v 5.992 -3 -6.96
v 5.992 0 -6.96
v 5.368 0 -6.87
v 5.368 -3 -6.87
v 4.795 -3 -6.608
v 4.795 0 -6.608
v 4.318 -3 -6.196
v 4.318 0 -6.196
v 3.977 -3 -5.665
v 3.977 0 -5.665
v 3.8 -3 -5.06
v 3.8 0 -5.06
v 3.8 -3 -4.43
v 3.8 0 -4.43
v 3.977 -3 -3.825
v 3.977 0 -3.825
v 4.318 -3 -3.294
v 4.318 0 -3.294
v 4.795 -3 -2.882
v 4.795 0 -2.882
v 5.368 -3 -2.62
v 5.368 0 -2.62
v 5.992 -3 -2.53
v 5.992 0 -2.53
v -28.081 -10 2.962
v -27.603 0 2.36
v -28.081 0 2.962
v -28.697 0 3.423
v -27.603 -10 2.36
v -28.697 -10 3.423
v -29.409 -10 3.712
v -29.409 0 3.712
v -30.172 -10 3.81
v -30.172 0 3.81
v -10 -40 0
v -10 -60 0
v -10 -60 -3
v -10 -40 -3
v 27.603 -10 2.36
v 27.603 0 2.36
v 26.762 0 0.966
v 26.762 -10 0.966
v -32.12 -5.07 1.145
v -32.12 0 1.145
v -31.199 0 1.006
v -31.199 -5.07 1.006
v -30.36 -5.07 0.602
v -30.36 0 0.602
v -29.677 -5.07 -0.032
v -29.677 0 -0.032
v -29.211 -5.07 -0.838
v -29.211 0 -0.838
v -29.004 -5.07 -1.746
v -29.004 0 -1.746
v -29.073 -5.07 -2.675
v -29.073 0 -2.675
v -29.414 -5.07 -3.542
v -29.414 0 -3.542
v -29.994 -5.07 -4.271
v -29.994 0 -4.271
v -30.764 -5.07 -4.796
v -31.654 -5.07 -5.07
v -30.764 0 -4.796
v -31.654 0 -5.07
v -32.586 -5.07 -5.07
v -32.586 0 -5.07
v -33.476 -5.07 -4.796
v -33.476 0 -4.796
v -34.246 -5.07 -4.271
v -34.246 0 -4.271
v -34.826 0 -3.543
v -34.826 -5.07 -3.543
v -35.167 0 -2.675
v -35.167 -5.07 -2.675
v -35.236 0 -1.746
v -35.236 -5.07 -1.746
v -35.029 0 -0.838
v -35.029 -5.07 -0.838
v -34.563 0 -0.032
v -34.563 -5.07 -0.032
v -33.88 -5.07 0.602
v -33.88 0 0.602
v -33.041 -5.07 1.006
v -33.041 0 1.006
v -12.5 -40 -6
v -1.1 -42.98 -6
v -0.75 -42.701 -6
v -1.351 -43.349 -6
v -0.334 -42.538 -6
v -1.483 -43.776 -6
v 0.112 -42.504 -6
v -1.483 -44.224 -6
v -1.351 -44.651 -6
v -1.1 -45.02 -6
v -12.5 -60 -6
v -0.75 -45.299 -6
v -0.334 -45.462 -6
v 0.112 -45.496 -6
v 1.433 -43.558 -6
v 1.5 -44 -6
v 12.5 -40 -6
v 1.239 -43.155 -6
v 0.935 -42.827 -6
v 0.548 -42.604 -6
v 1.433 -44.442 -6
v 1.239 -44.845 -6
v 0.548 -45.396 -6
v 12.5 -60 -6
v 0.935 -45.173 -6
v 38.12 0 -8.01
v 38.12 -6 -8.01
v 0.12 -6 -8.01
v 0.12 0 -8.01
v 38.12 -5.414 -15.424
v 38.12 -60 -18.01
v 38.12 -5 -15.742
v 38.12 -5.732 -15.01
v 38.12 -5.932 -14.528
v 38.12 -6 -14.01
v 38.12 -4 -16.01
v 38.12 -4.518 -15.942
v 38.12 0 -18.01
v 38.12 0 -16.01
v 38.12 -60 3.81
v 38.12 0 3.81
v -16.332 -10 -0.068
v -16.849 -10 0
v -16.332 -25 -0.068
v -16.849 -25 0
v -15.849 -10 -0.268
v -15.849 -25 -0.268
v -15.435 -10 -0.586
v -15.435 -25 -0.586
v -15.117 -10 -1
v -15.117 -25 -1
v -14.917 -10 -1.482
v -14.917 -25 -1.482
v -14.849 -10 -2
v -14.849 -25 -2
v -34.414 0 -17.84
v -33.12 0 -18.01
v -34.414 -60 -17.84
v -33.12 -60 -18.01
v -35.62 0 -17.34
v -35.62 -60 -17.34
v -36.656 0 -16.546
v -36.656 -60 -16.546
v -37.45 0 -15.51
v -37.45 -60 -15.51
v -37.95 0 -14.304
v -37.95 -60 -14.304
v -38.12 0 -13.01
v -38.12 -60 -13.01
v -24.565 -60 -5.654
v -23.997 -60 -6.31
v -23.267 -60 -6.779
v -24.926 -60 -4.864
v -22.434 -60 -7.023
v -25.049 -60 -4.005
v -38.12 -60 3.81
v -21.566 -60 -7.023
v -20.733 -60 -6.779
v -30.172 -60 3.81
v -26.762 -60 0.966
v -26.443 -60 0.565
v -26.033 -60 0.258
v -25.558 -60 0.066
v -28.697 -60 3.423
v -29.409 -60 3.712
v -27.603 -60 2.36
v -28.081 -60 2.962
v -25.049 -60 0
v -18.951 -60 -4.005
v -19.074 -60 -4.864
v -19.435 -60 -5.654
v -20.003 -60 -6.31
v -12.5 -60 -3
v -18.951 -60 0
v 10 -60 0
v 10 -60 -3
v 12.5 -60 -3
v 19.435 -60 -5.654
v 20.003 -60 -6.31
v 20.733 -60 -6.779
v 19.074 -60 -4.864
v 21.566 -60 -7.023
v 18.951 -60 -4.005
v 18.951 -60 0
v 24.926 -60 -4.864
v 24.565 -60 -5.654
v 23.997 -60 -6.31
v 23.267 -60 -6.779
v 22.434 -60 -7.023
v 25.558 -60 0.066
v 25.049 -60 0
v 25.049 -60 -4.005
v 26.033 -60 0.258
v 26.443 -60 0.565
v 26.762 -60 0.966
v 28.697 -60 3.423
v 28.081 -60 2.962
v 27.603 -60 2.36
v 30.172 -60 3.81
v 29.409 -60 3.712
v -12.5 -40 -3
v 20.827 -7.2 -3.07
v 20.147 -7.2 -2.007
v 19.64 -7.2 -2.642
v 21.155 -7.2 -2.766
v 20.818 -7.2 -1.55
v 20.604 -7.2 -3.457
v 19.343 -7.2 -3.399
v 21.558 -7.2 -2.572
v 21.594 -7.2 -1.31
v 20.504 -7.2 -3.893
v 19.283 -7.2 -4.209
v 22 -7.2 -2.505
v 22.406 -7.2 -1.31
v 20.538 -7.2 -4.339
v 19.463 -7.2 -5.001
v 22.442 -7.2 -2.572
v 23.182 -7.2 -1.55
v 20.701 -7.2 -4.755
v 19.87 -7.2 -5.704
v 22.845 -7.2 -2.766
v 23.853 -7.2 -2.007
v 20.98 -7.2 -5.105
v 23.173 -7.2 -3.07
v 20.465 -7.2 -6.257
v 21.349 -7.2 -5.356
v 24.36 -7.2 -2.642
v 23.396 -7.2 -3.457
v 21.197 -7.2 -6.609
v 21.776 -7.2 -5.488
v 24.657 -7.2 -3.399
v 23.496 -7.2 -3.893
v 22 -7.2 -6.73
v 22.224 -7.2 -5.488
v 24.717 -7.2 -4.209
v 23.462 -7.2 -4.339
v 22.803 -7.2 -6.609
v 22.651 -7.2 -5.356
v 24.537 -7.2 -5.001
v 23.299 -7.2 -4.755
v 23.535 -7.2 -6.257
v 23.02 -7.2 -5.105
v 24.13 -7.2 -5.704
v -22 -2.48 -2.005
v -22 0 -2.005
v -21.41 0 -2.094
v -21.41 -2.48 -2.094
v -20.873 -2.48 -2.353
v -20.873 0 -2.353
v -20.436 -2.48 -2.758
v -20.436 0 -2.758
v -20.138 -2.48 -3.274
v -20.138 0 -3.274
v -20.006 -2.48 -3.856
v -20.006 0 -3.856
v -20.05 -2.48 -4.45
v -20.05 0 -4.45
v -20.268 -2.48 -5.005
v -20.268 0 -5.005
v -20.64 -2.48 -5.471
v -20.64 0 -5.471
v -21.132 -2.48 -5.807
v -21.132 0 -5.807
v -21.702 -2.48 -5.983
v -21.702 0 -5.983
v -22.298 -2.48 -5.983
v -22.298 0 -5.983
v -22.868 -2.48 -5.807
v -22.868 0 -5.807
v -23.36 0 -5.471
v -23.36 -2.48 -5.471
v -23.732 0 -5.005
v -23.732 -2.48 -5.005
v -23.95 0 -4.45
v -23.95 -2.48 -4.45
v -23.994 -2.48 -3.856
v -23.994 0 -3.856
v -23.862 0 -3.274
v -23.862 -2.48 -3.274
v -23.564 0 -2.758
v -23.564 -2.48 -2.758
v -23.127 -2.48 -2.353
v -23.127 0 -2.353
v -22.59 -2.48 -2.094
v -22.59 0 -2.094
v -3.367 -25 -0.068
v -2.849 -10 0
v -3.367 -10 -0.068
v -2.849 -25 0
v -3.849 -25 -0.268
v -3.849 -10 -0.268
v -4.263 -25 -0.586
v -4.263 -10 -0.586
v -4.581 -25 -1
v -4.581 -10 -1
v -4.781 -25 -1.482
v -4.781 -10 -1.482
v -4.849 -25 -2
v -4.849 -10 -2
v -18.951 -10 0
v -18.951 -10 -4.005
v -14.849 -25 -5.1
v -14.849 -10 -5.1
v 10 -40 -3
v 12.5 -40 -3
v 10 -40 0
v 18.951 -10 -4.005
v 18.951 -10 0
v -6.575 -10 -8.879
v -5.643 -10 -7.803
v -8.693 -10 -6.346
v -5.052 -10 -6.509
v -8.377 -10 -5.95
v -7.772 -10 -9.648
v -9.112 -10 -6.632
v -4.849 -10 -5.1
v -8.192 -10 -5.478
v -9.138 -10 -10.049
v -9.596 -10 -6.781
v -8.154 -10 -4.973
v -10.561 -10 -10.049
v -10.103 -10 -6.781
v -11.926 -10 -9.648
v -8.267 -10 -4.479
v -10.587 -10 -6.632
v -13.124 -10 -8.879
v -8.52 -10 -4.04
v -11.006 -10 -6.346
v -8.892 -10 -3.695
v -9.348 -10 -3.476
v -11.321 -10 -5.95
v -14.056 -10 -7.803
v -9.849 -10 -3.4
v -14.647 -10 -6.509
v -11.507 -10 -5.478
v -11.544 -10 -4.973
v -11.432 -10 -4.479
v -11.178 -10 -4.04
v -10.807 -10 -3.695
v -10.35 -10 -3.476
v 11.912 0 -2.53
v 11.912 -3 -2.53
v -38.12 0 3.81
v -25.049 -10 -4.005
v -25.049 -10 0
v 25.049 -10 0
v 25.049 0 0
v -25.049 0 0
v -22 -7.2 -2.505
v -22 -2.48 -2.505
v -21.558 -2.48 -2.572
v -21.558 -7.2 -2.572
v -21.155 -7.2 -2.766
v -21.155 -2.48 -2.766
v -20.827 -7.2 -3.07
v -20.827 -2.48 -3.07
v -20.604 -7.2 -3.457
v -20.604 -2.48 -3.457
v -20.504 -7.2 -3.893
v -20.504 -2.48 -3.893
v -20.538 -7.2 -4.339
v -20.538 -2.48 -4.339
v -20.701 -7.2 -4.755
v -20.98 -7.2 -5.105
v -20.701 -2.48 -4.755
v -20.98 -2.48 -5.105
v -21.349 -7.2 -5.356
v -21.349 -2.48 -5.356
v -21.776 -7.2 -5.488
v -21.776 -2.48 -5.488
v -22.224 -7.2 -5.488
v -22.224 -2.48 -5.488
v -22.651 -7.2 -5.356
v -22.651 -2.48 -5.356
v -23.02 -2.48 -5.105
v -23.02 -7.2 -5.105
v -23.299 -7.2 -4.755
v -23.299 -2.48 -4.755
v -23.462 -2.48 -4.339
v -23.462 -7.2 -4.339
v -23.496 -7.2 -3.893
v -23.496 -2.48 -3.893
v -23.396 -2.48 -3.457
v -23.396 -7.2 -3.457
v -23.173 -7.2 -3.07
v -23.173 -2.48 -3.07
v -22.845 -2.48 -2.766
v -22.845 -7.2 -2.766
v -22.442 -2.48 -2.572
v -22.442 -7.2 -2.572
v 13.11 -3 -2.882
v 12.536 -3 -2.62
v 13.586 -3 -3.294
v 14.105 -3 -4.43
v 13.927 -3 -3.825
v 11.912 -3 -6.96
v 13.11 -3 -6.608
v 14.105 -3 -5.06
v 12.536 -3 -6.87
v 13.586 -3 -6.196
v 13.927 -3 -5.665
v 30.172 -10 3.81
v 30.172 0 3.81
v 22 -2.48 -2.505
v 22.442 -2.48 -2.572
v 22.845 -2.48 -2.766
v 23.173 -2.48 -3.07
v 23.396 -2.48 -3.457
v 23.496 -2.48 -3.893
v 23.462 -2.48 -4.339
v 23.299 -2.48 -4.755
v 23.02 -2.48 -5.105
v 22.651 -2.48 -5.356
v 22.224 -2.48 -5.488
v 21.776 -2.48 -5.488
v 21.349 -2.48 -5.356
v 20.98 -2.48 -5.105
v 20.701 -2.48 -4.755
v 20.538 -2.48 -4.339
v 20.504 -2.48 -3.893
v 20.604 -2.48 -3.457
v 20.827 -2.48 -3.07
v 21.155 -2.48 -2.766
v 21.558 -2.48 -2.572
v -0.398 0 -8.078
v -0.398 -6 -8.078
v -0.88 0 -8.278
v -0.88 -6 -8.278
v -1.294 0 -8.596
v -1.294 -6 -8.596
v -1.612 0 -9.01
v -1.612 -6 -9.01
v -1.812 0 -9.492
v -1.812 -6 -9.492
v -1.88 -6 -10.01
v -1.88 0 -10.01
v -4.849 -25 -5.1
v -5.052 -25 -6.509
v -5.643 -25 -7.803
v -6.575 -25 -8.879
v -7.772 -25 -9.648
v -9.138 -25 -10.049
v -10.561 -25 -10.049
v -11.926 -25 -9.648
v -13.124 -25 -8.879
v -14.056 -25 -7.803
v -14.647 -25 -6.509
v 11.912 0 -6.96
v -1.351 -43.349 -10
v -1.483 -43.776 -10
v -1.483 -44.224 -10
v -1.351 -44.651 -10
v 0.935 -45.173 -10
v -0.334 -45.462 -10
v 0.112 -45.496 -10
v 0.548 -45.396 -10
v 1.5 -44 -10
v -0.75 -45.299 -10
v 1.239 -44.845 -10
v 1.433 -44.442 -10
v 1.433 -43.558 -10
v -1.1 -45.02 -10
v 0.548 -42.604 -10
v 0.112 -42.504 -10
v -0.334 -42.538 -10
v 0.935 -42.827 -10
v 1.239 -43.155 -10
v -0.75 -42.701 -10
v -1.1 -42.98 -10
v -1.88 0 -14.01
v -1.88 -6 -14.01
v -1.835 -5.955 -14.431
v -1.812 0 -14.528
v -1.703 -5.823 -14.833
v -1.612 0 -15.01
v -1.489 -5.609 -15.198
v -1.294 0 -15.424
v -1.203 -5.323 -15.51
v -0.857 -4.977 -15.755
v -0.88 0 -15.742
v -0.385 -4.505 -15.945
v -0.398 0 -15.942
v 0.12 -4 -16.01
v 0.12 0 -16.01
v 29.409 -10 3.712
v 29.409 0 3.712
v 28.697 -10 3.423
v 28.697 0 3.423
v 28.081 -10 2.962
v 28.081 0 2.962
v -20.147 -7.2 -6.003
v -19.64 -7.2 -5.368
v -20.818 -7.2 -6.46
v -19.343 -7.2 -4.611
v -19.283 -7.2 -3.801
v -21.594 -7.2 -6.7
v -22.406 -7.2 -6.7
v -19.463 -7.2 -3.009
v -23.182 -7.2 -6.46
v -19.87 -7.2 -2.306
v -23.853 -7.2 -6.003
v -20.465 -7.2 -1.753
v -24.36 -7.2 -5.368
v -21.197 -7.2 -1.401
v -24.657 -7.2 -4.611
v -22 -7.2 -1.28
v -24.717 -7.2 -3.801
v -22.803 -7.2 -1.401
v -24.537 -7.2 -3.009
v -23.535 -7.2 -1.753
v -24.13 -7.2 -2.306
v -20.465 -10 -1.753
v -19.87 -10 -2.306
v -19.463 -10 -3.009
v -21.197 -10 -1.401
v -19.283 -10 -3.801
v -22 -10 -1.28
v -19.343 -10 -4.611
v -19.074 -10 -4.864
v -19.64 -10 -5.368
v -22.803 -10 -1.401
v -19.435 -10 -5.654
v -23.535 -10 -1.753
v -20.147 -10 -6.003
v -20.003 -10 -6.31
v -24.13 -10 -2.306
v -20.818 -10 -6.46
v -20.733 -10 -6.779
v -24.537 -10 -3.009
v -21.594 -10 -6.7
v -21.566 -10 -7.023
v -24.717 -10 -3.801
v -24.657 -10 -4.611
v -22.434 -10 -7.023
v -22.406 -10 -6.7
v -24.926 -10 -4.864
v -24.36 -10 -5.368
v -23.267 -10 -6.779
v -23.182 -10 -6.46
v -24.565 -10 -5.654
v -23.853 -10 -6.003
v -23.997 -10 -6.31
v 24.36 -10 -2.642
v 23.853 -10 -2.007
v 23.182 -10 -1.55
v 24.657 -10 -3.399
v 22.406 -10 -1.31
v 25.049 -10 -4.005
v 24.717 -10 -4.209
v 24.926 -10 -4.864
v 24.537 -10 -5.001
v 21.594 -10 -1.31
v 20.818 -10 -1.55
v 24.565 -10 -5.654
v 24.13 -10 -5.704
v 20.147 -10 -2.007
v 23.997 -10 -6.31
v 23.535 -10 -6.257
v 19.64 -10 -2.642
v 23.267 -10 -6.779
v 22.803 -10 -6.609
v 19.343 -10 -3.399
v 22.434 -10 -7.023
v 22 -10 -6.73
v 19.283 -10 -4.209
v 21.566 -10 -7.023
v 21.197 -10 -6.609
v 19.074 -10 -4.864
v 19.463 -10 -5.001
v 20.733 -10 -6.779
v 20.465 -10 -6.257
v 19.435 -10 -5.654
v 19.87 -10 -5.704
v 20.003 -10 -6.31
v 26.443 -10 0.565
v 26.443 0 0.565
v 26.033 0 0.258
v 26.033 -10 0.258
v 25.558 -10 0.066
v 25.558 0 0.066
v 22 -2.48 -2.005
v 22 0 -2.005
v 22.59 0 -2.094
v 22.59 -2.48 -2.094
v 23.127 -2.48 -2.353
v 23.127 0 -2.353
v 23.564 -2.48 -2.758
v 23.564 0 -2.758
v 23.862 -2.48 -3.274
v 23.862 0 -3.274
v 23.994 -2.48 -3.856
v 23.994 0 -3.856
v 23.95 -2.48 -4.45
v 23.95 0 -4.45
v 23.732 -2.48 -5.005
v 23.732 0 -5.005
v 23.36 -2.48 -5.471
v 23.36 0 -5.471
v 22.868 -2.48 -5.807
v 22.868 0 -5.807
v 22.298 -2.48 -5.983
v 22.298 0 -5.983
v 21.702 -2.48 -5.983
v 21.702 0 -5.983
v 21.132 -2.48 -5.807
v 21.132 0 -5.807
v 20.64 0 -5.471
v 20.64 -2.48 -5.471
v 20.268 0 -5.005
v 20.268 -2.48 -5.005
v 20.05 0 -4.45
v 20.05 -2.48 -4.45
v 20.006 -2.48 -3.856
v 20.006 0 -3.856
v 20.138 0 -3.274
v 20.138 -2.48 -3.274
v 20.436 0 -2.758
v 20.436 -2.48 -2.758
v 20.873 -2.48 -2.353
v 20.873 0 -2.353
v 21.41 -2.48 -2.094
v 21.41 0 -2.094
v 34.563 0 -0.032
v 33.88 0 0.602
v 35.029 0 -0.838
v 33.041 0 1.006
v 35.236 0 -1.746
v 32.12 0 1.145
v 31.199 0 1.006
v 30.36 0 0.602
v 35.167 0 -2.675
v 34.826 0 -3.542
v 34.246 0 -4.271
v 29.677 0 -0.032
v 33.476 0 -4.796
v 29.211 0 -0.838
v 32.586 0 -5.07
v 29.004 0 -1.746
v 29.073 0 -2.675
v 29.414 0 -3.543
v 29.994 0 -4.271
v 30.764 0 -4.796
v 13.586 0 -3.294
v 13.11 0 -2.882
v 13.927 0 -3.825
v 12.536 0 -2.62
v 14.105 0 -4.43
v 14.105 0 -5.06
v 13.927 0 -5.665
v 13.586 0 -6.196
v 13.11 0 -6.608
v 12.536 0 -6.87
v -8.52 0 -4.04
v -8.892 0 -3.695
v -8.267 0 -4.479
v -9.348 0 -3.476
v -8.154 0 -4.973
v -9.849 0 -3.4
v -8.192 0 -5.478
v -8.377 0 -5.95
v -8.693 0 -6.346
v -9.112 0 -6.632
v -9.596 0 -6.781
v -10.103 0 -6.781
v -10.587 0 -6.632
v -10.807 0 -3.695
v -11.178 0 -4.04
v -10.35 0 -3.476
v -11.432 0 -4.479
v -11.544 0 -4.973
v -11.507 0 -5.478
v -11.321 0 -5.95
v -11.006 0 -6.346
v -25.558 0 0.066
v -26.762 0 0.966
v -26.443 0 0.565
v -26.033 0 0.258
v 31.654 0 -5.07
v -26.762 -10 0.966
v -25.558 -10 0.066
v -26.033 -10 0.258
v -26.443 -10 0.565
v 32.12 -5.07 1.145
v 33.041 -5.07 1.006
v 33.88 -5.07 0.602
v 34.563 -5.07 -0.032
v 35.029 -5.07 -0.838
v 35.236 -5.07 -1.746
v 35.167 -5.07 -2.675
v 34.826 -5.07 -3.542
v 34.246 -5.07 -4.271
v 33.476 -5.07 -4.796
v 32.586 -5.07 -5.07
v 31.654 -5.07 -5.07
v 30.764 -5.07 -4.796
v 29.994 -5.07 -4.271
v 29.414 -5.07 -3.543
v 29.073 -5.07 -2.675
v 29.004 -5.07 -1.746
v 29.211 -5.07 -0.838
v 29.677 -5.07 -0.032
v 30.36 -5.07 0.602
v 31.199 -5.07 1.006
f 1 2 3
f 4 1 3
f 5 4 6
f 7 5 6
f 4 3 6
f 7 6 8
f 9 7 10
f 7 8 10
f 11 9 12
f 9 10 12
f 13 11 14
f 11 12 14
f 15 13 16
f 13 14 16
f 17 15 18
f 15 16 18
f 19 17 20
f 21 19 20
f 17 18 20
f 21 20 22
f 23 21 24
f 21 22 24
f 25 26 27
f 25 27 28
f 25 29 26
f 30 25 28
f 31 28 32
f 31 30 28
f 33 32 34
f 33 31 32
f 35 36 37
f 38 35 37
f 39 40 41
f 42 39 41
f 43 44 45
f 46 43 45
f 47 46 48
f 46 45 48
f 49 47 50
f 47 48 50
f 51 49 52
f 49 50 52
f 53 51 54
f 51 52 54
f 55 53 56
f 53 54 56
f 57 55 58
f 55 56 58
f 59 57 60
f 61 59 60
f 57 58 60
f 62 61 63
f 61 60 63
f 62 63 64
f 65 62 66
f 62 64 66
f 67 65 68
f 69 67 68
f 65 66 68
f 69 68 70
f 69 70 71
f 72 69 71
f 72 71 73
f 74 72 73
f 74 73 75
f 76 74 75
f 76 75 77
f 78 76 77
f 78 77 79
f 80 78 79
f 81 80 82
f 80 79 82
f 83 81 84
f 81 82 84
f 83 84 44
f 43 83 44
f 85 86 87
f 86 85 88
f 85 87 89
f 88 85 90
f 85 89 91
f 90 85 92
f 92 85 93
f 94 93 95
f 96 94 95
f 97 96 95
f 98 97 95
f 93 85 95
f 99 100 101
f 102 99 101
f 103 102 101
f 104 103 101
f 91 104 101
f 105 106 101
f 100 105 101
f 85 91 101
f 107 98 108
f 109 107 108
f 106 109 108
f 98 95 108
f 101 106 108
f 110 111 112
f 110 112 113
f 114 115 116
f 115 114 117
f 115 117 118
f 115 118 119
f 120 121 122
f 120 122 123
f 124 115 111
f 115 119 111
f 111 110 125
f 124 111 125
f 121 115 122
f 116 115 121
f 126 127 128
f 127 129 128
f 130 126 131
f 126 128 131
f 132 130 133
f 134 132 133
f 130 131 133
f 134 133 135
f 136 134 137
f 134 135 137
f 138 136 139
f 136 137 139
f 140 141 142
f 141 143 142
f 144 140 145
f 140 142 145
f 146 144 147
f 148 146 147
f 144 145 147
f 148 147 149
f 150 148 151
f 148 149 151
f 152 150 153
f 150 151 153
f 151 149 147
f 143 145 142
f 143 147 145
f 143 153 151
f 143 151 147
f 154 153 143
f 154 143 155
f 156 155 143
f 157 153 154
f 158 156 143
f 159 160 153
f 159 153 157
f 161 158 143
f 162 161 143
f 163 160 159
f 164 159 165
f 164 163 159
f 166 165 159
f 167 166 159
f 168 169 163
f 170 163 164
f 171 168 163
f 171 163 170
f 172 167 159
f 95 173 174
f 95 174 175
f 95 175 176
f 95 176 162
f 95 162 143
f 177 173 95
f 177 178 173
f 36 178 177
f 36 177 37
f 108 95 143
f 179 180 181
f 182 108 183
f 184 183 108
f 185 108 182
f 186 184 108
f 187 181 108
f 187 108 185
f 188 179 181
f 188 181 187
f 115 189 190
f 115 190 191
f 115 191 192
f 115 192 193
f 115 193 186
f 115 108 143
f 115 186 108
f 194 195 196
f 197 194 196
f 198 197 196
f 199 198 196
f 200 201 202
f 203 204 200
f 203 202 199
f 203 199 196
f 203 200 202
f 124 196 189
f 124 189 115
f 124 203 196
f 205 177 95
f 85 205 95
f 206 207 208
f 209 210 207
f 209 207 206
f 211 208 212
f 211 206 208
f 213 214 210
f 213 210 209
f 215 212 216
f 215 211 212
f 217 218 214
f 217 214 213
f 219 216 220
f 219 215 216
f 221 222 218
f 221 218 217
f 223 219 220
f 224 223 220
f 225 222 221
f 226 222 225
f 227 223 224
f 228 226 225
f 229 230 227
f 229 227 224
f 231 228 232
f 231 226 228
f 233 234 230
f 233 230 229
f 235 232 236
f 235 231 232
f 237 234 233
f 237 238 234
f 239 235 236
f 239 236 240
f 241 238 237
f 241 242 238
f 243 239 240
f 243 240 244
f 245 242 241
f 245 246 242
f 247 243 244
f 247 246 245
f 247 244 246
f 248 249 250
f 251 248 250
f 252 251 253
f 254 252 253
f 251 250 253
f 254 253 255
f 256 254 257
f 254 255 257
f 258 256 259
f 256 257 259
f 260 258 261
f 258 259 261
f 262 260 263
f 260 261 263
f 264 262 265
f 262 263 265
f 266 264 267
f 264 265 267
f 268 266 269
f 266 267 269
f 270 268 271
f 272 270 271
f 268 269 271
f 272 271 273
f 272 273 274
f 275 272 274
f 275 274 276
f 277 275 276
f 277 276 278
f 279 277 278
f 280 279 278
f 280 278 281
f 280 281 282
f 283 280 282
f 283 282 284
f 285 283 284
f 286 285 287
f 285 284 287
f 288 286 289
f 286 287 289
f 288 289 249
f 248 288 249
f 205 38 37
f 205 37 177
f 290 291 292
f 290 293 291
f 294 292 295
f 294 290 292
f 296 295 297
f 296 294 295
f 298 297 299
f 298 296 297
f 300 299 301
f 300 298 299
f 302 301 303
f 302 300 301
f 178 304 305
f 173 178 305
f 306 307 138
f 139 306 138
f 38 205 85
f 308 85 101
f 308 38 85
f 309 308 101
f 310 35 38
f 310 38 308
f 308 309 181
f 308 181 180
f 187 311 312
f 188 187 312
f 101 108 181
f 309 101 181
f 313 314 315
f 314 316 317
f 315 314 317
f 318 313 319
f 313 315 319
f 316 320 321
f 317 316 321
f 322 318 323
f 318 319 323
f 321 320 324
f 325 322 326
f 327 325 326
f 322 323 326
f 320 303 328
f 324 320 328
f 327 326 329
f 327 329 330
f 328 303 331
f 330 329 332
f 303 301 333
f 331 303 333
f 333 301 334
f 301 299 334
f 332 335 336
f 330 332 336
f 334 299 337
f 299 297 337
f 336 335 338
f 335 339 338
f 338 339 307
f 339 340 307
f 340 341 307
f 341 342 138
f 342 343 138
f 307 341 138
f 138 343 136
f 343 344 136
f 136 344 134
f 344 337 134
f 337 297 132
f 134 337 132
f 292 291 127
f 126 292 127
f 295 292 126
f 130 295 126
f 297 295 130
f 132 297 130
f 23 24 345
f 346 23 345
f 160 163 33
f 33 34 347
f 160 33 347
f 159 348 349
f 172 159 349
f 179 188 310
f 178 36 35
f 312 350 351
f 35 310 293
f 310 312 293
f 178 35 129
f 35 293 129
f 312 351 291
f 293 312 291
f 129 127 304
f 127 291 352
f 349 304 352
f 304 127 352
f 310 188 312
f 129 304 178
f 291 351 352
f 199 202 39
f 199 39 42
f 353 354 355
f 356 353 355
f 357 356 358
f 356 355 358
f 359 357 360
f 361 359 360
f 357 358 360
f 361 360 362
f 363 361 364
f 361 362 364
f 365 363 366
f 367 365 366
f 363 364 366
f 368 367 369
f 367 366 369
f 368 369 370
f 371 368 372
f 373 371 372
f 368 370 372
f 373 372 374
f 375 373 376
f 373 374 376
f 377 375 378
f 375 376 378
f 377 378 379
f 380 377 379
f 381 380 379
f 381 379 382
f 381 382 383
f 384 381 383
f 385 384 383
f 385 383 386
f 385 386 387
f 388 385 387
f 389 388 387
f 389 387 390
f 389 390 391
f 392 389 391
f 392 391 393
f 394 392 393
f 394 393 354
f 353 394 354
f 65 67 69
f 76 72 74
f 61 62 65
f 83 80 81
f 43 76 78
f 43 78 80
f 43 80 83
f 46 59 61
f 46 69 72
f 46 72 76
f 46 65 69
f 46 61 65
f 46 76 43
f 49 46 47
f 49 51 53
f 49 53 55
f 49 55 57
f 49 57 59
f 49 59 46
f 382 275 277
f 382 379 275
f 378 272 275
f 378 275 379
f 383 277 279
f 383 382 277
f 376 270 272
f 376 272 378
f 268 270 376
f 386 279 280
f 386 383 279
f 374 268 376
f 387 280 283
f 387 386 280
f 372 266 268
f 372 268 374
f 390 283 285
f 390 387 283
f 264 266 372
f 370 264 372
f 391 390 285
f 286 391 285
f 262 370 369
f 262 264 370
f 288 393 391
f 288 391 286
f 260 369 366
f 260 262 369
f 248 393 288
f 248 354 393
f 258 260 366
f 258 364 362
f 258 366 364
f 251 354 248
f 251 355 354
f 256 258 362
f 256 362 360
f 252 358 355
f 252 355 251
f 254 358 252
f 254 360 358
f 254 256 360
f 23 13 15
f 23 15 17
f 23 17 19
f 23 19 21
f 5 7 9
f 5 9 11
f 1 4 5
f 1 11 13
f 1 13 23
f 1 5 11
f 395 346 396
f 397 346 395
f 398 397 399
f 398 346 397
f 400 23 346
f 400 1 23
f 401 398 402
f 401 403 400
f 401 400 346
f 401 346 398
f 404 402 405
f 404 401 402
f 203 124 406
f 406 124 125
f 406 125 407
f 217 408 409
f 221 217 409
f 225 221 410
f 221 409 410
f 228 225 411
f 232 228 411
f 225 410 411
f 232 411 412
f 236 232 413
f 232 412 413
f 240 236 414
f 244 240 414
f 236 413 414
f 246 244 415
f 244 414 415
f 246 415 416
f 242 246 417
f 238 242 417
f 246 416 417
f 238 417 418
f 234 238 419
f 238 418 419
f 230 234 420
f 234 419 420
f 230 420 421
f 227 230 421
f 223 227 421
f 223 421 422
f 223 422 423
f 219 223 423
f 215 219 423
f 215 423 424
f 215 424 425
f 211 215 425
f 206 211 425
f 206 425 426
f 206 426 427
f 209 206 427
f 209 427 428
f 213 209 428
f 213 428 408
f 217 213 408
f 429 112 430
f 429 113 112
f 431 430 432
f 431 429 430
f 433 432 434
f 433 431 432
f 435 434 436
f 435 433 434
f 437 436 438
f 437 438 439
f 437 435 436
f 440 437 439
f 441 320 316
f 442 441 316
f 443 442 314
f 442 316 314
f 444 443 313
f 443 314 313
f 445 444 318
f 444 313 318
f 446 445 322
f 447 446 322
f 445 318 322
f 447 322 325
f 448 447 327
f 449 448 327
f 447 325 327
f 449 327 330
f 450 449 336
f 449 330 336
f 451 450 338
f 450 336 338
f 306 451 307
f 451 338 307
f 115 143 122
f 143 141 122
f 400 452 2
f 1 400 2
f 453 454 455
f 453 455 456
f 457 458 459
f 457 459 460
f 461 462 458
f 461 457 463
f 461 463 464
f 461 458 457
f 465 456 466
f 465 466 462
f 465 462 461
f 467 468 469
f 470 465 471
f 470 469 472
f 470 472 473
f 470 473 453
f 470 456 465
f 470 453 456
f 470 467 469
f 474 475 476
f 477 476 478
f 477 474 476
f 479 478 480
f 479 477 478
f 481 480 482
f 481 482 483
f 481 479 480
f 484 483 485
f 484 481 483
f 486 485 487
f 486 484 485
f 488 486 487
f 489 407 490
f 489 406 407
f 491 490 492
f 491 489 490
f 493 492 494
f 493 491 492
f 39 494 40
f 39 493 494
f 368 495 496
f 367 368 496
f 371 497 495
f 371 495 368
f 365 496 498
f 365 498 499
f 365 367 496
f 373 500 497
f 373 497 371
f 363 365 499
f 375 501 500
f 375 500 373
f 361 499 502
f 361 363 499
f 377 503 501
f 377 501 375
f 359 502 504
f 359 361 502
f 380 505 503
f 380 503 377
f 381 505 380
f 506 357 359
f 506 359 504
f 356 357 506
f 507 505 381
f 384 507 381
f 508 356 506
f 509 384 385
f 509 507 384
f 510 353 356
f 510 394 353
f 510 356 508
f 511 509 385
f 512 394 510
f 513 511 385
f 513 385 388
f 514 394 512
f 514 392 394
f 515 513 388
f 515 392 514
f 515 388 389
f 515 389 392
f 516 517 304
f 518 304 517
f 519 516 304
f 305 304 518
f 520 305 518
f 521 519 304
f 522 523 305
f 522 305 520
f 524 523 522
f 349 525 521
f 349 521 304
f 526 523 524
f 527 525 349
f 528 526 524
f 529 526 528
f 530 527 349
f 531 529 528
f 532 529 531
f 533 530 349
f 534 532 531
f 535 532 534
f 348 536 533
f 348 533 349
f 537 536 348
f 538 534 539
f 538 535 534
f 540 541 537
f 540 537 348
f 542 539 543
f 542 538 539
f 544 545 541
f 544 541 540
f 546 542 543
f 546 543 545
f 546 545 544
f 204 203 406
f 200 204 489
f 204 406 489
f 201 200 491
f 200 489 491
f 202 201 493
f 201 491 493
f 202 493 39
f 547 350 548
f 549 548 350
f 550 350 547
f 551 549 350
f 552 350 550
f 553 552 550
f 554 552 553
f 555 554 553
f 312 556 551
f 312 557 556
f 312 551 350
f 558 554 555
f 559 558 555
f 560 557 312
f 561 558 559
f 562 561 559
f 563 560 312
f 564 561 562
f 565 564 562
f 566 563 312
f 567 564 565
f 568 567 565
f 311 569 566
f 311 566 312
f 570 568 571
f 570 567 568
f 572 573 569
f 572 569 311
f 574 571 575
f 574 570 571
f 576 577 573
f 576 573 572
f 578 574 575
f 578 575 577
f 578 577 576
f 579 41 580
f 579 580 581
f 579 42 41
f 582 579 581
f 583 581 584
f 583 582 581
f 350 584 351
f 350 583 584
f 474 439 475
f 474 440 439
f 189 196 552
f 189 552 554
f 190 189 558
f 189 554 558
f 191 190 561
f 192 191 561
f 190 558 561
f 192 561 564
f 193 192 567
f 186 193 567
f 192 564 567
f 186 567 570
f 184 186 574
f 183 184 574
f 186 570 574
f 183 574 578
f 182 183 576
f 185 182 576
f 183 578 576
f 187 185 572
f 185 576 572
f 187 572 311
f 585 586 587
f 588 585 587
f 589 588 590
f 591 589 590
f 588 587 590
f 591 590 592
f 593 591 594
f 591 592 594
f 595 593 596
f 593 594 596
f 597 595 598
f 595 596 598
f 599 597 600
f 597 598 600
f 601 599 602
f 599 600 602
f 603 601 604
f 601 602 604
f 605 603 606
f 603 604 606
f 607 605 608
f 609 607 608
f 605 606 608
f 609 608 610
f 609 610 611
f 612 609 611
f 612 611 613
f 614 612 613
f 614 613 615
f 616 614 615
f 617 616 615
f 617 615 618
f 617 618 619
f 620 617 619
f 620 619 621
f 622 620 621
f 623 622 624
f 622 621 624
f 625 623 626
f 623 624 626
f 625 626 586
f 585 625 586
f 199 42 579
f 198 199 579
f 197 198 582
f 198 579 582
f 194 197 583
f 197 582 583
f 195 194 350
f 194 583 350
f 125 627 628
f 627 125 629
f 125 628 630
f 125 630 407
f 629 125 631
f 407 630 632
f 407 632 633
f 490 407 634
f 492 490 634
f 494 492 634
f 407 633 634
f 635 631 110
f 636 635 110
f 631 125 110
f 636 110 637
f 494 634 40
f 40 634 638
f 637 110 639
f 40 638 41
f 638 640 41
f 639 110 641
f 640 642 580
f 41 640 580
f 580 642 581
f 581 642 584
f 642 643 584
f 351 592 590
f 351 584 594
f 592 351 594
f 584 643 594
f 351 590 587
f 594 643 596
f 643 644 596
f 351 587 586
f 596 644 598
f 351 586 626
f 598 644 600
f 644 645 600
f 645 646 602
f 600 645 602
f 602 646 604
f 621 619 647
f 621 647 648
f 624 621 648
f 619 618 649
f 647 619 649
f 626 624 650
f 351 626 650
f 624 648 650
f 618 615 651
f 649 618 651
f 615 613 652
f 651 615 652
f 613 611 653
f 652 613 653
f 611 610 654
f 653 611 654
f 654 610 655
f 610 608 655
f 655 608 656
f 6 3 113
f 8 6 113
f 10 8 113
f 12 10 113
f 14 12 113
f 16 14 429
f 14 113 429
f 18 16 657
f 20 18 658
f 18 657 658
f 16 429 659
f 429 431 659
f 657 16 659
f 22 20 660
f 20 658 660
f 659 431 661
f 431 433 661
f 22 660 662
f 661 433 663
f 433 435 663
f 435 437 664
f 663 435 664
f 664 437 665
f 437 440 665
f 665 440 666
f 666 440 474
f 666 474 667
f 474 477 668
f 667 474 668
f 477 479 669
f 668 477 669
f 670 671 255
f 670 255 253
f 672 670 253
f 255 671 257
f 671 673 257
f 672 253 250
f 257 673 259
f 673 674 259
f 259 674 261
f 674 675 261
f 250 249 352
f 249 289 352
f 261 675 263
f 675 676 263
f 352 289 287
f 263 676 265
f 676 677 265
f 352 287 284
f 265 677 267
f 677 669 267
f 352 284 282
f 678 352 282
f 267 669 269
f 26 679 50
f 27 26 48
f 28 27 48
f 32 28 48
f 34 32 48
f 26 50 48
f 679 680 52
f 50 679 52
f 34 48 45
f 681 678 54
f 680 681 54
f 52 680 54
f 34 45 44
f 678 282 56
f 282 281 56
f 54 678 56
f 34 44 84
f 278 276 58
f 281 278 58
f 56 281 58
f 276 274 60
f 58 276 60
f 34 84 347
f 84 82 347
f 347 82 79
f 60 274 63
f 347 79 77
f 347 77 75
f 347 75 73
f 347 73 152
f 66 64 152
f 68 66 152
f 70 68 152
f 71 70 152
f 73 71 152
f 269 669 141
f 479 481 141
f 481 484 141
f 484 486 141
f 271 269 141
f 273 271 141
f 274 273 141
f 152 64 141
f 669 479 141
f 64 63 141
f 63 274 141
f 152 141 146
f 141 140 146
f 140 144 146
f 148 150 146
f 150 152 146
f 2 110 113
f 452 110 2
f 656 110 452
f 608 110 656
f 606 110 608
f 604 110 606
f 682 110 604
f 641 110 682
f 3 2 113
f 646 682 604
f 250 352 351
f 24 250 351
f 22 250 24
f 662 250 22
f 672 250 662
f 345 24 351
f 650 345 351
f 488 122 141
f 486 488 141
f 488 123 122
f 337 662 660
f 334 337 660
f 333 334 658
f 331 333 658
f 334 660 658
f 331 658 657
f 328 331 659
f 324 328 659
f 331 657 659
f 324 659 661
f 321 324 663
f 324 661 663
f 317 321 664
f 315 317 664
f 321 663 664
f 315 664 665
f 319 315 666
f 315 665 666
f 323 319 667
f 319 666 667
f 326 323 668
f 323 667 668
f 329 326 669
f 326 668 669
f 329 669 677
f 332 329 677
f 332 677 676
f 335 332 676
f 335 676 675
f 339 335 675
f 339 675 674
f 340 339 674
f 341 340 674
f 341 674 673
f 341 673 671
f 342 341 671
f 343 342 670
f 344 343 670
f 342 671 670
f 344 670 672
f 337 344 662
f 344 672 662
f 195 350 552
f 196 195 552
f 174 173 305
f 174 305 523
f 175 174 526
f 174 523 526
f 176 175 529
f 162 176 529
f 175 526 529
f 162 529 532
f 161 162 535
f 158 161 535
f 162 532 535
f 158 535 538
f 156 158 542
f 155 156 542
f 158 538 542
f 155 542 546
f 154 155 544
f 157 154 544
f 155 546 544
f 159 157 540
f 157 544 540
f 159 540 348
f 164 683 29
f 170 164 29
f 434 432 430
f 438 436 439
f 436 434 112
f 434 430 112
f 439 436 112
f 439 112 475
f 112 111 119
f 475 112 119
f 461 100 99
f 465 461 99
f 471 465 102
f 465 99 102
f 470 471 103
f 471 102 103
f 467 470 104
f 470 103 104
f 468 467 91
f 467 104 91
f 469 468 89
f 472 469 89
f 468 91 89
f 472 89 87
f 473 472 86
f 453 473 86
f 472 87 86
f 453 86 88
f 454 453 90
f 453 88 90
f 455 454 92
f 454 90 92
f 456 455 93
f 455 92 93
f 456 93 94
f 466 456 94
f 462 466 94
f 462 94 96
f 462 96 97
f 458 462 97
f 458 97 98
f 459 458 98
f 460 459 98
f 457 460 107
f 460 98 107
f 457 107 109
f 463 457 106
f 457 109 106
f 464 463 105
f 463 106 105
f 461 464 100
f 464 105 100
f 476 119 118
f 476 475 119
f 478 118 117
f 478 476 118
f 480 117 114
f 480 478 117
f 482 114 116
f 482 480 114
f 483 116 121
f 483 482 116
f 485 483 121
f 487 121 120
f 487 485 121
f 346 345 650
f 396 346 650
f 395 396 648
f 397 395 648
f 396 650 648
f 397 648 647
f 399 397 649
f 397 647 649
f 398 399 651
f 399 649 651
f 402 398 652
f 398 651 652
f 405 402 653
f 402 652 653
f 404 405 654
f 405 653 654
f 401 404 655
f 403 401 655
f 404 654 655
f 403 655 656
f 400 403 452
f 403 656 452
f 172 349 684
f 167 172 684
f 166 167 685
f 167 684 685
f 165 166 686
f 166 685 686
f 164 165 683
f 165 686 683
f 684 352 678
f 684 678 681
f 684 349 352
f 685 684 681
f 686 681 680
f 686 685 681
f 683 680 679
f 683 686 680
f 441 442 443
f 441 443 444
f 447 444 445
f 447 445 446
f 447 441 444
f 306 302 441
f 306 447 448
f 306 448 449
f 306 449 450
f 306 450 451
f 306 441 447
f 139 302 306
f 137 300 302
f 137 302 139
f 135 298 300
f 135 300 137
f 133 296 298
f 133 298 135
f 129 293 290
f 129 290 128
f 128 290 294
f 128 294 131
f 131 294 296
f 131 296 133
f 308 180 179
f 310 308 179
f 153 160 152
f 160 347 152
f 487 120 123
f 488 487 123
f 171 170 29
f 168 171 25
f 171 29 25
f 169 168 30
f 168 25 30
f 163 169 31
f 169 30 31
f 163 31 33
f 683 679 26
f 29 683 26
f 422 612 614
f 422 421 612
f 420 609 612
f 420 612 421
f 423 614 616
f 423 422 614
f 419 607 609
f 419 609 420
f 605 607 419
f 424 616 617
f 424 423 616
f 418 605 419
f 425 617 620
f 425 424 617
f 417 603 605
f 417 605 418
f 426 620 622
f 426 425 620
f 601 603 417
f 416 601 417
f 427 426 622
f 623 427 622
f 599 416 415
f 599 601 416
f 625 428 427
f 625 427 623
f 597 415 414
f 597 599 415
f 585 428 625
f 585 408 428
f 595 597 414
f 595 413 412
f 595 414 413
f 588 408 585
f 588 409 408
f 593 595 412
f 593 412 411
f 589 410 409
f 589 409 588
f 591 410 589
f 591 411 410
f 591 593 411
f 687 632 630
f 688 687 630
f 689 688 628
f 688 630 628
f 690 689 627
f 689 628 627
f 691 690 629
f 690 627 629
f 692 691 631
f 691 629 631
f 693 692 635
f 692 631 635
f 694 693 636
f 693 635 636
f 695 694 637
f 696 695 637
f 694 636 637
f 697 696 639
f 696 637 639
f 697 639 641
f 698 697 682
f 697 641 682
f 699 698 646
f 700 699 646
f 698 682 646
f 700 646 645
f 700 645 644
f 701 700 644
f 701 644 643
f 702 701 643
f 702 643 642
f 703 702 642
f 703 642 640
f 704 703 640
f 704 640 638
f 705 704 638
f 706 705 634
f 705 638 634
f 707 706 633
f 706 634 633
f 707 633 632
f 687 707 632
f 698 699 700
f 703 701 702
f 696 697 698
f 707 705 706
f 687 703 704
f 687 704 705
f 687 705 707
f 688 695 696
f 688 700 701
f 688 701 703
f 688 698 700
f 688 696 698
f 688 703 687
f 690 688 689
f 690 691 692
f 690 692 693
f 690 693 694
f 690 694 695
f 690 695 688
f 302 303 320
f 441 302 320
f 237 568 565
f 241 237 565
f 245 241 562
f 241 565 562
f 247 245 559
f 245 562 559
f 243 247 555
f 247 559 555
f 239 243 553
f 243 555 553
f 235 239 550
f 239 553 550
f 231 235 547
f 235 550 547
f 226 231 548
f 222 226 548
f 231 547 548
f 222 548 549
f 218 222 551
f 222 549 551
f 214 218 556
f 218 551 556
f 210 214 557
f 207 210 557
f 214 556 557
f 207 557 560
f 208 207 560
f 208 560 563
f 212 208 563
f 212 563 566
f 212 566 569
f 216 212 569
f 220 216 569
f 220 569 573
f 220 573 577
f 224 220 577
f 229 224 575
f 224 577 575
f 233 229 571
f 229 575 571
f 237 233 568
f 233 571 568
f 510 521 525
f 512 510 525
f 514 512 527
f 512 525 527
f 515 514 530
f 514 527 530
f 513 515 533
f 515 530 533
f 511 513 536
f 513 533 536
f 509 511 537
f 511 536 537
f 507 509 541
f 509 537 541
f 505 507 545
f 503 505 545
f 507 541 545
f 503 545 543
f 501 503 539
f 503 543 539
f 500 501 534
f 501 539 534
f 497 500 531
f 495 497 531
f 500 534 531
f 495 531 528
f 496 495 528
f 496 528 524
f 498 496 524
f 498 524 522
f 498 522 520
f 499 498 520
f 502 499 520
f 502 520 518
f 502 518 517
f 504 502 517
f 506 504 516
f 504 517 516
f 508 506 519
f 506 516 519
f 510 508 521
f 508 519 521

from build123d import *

# Parameters (mm, degrees)
SKETCH1_R           = 2
SKETCH1_R_2         = 3.125
SKETCH1_R_3         = 1.7
BOSS_EXTRUDE1_DEPTH = 10
FILLET2_R           = 3
FILLET1_R           = 2
SKETCH1_4_R         = 3.125
CUT_EXTRUDE3_DEPTH  = 5.07
SKETCH1_7_R         = 1.7
CUT_EXTRUDE6_DEPTH  = 10
CUT_EXTRUDE5_DEPTH  = 3
SKETCH1_5_R         = 2
CUT_EXTRUDE4_DEPTH  = 2.48
SKETCH4_R           = 1.5
CUT_EXTRUDE7_DEPTH  = 10
SKETCH5_R           = 2.725
CUT_EXTRUDE8_DEPTH  = 2.8
BOSS_EXTRUDE2_DEPTH = 10
BOSS_EXTRUDE3_DEPTH = 50
FILLET13_R          = 5
CUT_EXTRUDE14_DEPTH = 15
SKETCH10_W          = 8
SKETCH10_H          = 6
CUT_EXTRUDE12_DEPTH = 40
FILLET12_R          = 2
FILLET14_R          = 2
CUT_EXTRUDE17_DEPTH = 20
SKETCH19_R          = 1.5
CUT_EXTRUDE18_DEPTH = 4


with BuildPart() as part:
    # Sketch1 → Boss-Extrude1 (new body)
    with BuildSketch(Plane(origin=(0, 0, 0), x_dir=(1, 0, 0), z_dir=(0, 1, 0))):
        with BuildLine():
            ThreePointArc((-11.409245094, 8.977987014), (-9.849239736, 9.28), (-8.289234378, 8.977987014))
            ThreePointArc((-8.289234378, 8.977987014), (-5.835653376, 8.254222737), (-3.289234378, 8.01))
            Line((-3.289234378, 8.01), (38.12, 8.01))
            Line((38.12, 8.01), (38.12, -3.81))
            Line((38.12, -3.81), (28.478275237, -3.81))
            Line((28.478275237, -3.81), (26.178275237, 0))
            Line((26.178275237, 0), (-26.178275237, 0))
            Line((-26.178275237, 0), (-28.478275237, -3.81))
            Line((-28.478275237, -3.81), (-38.12, -3.81))
            Line((-38.12, -3.81), (-38.12, 8.01))
            Line((-38.12, 8.01), (-16.409245094, 8.01))
            ThreePointArc((-16.409245094, 8.01), (-13.862826096, 8.254222737), (-11.409245094, 8.977987014))
        make_face()
        with Locations((22, 4.005)):
            Circle(SKETCH1_R, mode=Mode.SUBTRACT)
        with Locations((-22, 4.005)):
            Circle(SKETCH1_R, mode=Mode.SUBTRACT)
        with Locations((-32.12, 1.98)):
            Circle(SKETCH1_R_2, mode=Mode.SUBTRACT)
        with Locations((32.12, 1.98)):
            Circle(SKETCH1_R_2, mode=Mode.SUBTRACT)
        with Locations((-9.849239736, 5.1)):
            Circle(SKETCH1_R_3, mode=Mode.SUBTRACT)
        with BuildLine():
            ThreePointArc((11.912105026, 2.53), (14.127105026, 4.745), (11.912105026, 6.96))
            Line((11.912105026, 6.96), (5.992105026, 6.96))
            ThreePointArc((5.992105026, 6.96), (3.777105026, 4.745), (5.992105026, 2.53))
            Line((5.992105026, 2.53), (11.912105026, 2.53))
        make_face(mode=Mode.SUBTRACT)
        with Locations((-22, 4.005)):
            Circle(SKETCH1_R)
        with Locations((-9.849239736, 5.1)):
            Circle(SKETCH1_R_3)
        with Locations((-32.12, 1.98)):
            Circle(SKETCH1_R_2)
        with BuildLine():
            Line((5.992105026, 2.53), (11.912105026, 2.53))
            ThreePointArc((11.912105026, 2.53), (14.127105026, 4.745), (11.912105026, 6.96))
            Line((11.912105026, 6.96), (5.992105026, 6.96))
            ThreePointArc((5.992105026, 6.96), (3.777105026, 4.745), (5.992105026, 2.53))
        make_face()
        with Locations((22, 4.005)):
            Circle(SKETCH1_R)
        with Locations((32.12, 1.98)):
            Circle(SKETCH1_R_2)
    extrude(amount=-BOSS_EXTRUDE1_DEPTH)

    # Fillet2
    fillet2_edges = [part.edges().sort_by_distance(p)[0] for p in [
        (28.478275237, -5, 3.81),
        (-28.478275237, -5, 3.81),
    ]]
    fillet(fillet2_edges, radius=FILLET2_R)

    # Fillet1
    fillet1_edges = [part.edges().sort_by_distance(p)[0] for p in [
        (26.178275237, -5, 0),
        (-26.178275237, -5, 0),
    ]]
    fillet(fillet1_edges, radius=FILLET1_R)

    # Sketch1_4 → Cut-Extrude3 (cut)
    with BuildSketch(Plane(origin=(0, 0, 0), x_dir=(1, 0, 0), z_dir=(0, 1, 0))):
        with Locations(Location((32.12, 1.98, 0), (0, 0, 270))):
            Circle(SKETCH1_4_R)
        with Locations(Location((-32.12, 1.98, 0), (0, 0, 270))):
            Circle(SKETCH1_4_R)
    extrude(amount=-CUT_EXTRUDE3_DEPTH, mode=Mode.SUBTRACT)

    # Sketch1_7 → Cut-Extrude6 (cut)
    with BuildSketch(Plane(origin=(0, 0, 0), x_dir=(1, 0, 0), z_dir=(0, 1, 0))):
        with Locations(Location((-9.849239736, 5.1, 0), (0, 0, 270))):
            Circle(SKETCH1_7_R)
    extrude(amount=-CUT_EXTRUDE6_DEPTH, mode=Mode.SUBTRACT)

    # Sketch1_6 → Cut-Extrude5 (cut)
    with BuildSketch(Plane(origin=(0, 0, 0), x_dir=(1, 0, 0), z_dir=(0, 1, 0))):
        with BuildLine():
            Line((5.992105026, 2.53), (11.912105026, 2.53))
            ThreePointArc((11.912105026, 2.53), (14.127105026, 4.745), (11.912105026, 6.96))
            Line((11.912105026, 6.96), (5.992105026, 6.96))
            ThreePointArc((5.992105026, 6.96), (3.777105026, 4.745), (5.992105026, 2.53))
        make_face()
    extrude(amount=-CUT_EXTRUDE5_DEPTH, mode=Mode.SUBTRACT)

    # Sketch1_5 → Cut-Extrude4 (cut)
    with BuildSketch(Plane(origin=(0, 0, 0), x_dir=(1, 0, 0), z_dir=(0, 1, 0))):
        with Locations(Location((-22, 4.005, 0), (0, 0, 270))):
            Circle(SKETCH1_5_R)
        with Locations(Location((22, 4.005, 0), (0, 0, 270))):
            Circle(SKETCH1_5_R)
    extrude(amount=-CUT_EXTRUDE4_DEPTH, mode=Mode.SUBTRACT)

    # Sketch4 → Cut-Extrude7 (cut)
    with BuildSketch(Plane(origin=(0, 0, 0), x_dir=(1, 0, 0), z_dir=(0, 1, 0))):
        with Locations(Location((-22, 4.005, 0), (0, 0, 270))):
            Circle(SKETCH4_R)
        with Locations(Location((22, 4.005, 0), (0, 0, 270))):
            Circle(SKETCH4_R)
    extrude(amount=-CUT_EXTRUDE7_DEPTH, mode=Mode.SUBTRACT)

    # Sketch5 → Cut-Extrude8 (cut)
    with BuildSketch(Plane.XZ.offset(10)):
        with Locations(Location((22, -4.005, 0), (0, 0, 270))):
            Circle(SKETCH5_R)
        with Locations(Location((-22, -4.005, 0), (0, 0, 90))):
            Circle(SKETCH5_R)
    extrude(amount=-CUT_EXTRUDE8_DEPTH, mode=Mode.SUBTRACT)

    # Sketch6 → Boss-Extrude2 (add)
    with BuildSketch(Plane(origin=(0, 0, 0), x_dir=(1, 0, 0), z_dir=(0, 1, 0))):
        with BuildLine():
            Line((-38.12, 8.01), (-38.12, 18.01))
            Line((-38.12, 18.01), (38.12, 18.01))
            Line((38.12, 18.01), (38.12, 8.01))
            Line((38.12, 8.01), (-3.289234378, 8.01))
            ThreePointArc((-3.289234378, 8.01), (-5.835653376, 8.254222737), (-8.289234378, 8.977987014))
            ThreePointArc((-8.289234378, 8.977987014), (-9.849239736, 9.28), (-11.409245094, 8.977987014))
            ThreePointArc((-11.409245094, 8.977987014), (-13.862826096, 8.254222737), (-16.409245094, 8.01))
            Line((-16.409245094, 8.01), (-38.12, 8.01))
        make_face()
    extrude(amount=-BOSS_EXTRUDE2_DEPTH)

    # Sketch8 → Boss-Extrude3 (add)
    with BuildSketch(Plane.XZ.offset(10)):
        with BuildLine():
            Line((18.950546011, 0), (-18.950546011, 0))
            Line((-18.950546011, 0), (-18.950546011, -4.005))
            ThreePointArc((-18.950546011, -4.005), (-22, -7.054453989), (-25.049453989, -4.005))
            Line((-25.049453989, -4.005), (-25.049453989, 0))
            ThreePointArc((-25.049453989, 0), (-26.032503369, 0.25827272), (-26.761657912, 0.966386084))
            Line((-26.761657912, 0.966386084), (-27.603201224, 2.360420875))
            ThreePointArc((-27.603201224, 2.360420875), (-28.696933037, 3.422590919), (-30.171507108, 3.81))
            Line((-30.171507108, 3.81), (-38.12, 3.81))
            Line((-38.12, 3.81), (-38.12, -18.01))
            Line((-38.12, -18.01), (38.12, -18.01))
            Line((38.12, -18.01), (38.12, 3.81))
            Line((38.12, 3.81), (30.171507108, 3.81))
            ThreePointArc((30.171507108, 3.81), (28.696933037, 3.422590919), (27.603201224, 2.360420875))
            Line((27.603201224, 2.360420875), (26.761657912, 0.966386084))
            ThreePointArc((26.761657912, 0.966386084), (26.032503369, 0.25827272), (25.049453989, 0))
            Line((25.049453989, 0), (25.049453989, -4.005))
            ThreePointArc((25.049453989, -4.005), (22, -7.054453989), (18.950546011, -4.005))
            Line((18.950546011, -4.005), (18.950546011, 0))
        make_face()
    extrude(amount=BOSS_EXTRUDE3_DEPTH)

    # Fillet13
    fillet13_edges = [part.edges().sort_by_distance(p)[0] for p in [
        (-38.12, -30, -18.01),
    ]]
    fillet(fillet13_edges, radius=FILLET13_R)

    # Sketch8_3 → Cut-Extrude14 (cut)
    with BuildSketch(Plane.XZ.offset(10)):
        with BuildLine():
            Line((-4.849239736, 0), (-4.849239736, -5.1))
            ThreePointArc((-4.849239736, -5.1), (-9.849239736, -10.1), (-14.849239736, -5.1))
            Line((-14.849239736, -5.1), (-14.849239736, 0))
            Line((-14.849239736, 0), (-4.849239736, 0))
        make_face()
    extrude(amount=CUT_EXTRUDE14_DEPTH, mode=Mode.SUBTRACT)

    # Sketch10 → Cut-Extrude12 (cut)
    with BuildSketch(Plane(origin=(38.12, 0, 0), x_dir=(0, 0, -1), z_dir=(1, 0, 0))):
        with Locations((12.01, -3)):
            Rectangle(SKETCH10_W, SKETCH10_H)
    extrude(amount=-CUT_EXTRUDE12_DEPTH, mode=Mode.SUBTRACT)

    # Fillet12
    fillet12_edges = [part.edges().sort_by_distance(p)[0] for p in [
        (-4.849239736, -17.5, 0),
        (-14.849239736, -17.5, 0),
    ]]
    fillet(fillet12_edges, radius=FILLET12_R)

    # Fillet14
    fillet14_edges = [part.edges().sort_by_distance(p)[0] for p in [
        (-1.88, -3, -16.01),
        (18.12, -6, -16.01),
        (-1.88, -3, -8.01),
    ]]
    fillet(fillet14_edges, radius=FILLET14_R)

    # Sketch18 → Cut-Extrude17 (cut)
    with BuildSketch(Plane.XZ.offset(60)):
        Polygon((-10, 0), (-10, -3), (-12.5, -3), (-12.5, -6), (12.5, -6), (12.5, -3), (10, -3), (10, 0), align=None)
    extrude(amount=-CUT_EXTRUDE17_DEPTH, mode=Mode.SUBTRACT)

    # Sketch19 → Cut-Extrude18 (cut)
    with BuildSketch(Plane.XY.offset(-6)):
        with Locations((0, -44)):
            Circle(SKETCH19_R)
    extrude(amount=-CUT_EXTRUDE18_DEPTH, mode=Mode.SUBTRACT)


solid = part.part
